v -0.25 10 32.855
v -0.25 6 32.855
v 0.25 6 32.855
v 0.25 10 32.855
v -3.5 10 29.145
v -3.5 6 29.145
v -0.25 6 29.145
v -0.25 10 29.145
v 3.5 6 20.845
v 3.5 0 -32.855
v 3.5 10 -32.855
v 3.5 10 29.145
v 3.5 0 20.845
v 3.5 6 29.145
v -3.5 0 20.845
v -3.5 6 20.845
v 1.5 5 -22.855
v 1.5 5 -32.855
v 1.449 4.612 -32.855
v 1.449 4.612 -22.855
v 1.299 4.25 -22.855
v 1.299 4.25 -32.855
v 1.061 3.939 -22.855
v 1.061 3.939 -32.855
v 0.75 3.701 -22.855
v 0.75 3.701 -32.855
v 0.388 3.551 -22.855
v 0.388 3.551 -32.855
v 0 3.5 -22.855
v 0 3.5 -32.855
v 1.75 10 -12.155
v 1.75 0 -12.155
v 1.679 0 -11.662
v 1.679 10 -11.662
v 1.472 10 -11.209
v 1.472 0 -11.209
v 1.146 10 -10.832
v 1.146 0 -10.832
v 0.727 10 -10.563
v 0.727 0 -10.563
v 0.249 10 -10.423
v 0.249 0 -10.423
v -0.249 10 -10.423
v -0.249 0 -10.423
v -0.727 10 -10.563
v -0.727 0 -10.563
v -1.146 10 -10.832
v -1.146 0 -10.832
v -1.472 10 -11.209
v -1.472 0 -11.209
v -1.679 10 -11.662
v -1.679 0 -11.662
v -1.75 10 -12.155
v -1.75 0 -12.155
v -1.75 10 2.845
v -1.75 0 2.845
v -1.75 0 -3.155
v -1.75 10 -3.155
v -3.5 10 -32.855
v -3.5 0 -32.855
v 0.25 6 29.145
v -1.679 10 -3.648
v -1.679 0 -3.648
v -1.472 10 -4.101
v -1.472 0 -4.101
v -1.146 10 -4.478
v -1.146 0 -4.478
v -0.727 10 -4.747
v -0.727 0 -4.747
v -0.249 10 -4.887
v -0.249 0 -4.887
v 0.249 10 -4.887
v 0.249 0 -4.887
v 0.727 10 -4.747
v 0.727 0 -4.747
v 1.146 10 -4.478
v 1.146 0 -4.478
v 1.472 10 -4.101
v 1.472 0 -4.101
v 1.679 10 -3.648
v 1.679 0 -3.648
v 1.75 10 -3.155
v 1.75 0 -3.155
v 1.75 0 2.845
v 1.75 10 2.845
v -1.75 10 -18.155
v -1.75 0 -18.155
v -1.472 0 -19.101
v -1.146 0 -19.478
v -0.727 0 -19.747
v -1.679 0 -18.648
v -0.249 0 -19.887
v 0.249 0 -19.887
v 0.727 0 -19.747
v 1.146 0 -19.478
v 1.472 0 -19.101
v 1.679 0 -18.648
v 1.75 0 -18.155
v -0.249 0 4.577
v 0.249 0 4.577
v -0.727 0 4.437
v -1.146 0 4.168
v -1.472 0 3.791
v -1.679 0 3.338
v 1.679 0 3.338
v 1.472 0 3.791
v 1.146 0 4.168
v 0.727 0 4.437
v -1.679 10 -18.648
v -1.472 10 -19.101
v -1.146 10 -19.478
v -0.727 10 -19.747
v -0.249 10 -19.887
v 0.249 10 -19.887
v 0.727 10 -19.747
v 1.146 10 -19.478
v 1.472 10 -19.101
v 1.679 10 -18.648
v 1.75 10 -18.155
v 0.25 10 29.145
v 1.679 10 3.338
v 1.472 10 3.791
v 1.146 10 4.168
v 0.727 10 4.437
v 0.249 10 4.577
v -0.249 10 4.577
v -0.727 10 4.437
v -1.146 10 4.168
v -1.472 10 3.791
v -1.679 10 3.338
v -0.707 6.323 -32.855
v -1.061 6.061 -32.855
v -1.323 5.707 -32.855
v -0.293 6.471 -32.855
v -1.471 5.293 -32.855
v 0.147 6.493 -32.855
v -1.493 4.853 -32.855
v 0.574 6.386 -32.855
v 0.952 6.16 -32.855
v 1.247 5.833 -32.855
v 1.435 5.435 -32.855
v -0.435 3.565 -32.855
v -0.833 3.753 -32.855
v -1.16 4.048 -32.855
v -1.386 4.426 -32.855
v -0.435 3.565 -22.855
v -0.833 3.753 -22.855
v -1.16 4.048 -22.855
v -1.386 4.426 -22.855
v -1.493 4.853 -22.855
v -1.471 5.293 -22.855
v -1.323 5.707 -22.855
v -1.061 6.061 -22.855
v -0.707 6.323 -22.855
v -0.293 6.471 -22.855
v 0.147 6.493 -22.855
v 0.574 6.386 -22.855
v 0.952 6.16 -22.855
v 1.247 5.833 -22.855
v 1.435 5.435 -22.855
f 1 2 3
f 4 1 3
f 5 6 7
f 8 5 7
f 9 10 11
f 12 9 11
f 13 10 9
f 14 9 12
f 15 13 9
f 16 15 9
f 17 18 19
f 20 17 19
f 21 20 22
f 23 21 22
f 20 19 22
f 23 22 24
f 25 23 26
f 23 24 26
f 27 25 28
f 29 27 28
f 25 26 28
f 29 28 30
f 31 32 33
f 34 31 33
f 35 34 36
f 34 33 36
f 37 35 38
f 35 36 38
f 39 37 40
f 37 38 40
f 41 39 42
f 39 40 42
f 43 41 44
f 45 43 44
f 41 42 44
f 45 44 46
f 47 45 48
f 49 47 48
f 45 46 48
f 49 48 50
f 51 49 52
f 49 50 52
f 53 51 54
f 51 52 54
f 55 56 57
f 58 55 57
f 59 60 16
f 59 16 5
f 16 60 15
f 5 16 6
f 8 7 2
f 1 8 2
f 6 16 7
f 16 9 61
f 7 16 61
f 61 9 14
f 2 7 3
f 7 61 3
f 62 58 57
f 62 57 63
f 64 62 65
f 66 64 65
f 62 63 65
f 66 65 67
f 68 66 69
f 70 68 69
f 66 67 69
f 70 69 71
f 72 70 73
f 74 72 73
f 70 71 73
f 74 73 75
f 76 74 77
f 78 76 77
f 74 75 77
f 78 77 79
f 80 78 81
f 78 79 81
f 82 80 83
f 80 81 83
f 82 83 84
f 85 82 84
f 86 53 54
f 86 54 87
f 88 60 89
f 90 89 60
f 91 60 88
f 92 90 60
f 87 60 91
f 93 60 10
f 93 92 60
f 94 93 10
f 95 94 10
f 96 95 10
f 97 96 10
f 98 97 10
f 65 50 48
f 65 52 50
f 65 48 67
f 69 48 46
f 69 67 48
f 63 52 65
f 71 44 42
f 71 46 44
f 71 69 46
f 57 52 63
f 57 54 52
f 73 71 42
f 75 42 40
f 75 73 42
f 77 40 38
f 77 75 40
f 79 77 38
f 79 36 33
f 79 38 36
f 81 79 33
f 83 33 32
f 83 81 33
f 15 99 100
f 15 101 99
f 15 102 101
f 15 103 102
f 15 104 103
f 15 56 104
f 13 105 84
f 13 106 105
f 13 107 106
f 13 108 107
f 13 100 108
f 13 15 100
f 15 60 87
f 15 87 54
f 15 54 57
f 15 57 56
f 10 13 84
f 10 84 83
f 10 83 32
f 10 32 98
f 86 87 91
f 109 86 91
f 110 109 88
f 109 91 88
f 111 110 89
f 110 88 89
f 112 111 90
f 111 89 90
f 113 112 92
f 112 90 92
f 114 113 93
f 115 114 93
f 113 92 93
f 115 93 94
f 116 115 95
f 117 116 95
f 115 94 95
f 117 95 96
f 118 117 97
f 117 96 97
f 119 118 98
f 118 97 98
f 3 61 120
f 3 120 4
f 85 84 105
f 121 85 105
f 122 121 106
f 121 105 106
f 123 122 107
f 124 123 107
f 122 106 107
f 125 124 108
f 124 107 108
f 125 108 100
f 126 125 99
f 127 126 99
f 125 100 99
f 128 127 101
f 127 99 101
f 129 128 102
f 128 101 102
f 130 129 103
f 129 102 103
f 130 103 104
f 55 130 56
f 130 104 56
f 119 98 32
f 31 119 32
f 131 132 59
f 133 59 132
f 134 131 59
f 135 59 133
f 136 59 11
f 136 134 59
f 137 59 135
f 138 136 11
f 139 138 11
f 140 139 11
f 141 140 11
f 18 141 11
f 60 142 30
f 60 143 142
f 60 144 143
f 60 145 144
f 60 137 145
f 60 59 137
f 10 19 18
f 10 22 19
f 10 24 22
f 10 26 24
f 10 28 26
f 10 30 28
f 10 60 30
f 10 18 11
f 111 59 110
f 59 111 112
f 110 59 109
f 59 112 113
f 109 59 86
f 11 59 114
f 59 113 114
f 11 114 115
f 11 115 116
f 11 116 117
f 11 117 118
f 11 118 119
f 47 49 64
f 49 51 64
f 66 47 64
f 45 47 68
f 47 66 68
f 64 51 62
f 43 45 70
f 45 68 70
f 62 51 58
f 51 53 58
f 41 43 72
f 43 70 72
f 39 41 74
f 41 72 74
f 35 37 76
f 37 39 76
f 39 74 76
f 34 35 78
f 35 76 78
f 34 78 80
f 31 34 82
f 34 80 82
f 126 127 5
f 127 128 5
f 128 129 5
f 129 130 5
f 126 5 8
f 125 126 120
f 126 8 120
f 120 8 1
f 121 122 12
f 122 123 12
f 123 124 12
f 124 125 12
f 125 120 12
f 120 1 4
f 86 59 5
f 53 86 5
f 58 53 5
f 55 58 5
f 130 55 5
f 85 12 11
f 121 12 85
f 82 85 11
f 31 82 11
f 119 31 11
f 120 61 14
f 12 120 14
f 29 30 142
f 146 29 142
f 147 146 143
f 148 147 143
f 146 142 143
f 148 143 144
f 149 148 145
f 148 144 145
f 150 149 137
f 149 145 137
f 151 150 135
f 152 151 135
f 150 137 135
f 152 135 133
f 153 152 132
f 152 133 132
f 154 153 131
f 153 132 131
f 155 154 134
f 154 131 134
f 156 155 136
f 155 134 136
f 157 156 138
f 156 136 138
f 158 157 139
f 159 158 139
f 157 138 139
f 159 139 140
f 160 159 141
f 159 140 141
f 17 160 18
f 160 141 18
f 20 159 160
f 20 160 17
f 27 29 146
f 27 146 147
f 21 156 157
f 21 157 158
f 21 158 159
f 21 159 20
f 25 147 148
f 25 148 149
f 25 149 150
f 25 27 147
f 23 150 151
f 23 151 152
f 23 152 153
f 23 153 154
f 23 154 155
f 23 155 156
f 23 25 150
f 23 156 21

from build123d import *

# Parameters (mm, degrees)
F0_W     = 7
F0_H     = 65.71
F1_DEPTH = 10
F2_W     = 3.25
F2_H     = 3.71
F3_DEPTH = 10
F5_DEPTH = 10
F6_W     = 6
F6_H     = 12.01
F7_DEPTH = 7
F9_DEPTH = 10


with BuildPart() as f1:
    # F0 (on Front) → F1 (new body)
    with BuildSketch(Plane.XZ):
        Rectangle(F0_W, F0_H)
    extrude(amount=-F1_DEPTH)

    # F2 (on face) → F3 (cut, through all)
    with BuildSketch(Plane.XZ):
        with Locations((-1.875, 31)):
            Rectangle(F2_W, F2_H)
        with Locations((1.875, 31)):
            Rectangle(F2_W, F2_H)
    extrude(amount=-F3_DEPTH, mode=Mode.SUBTRACT)

    # F4 (on face) → F5 (cut, through all)
    with BuildSketch(Plane.XZ):
        with BuildLine():
            Line((-1.75, -12.155), (-1.75, -18.155))
            ThreePointArc((-1.75, -18.155), (0, -19.905), (1.75, -18.155))
            Line((1.75, -18.155), (1.75, -12.155))
            ThreePointArc((1.75, -12.155), (0, -10.405), (-1.75, -12.155))
        make_face()
        with BuildLine():
            Line((-1.75, 2.845), (-1.75, -3.155))
            ThreePointArc((-1.75, -3.155), (0, -4.905), (1.75, -3.155))
            Line((1.75, -3.155), (1.75, 2.845))
            ThreePointArc((1.75, 2.845), (0, 4.595), (-1.75, 2.845))
        make_face()
    extrude(amount=-F5_DEPTH, mode=Mode.SUBTRACT)

    # F6 (on face) → F7 (cut, through all)
    with BuildSketch(Plane.YZ.offset(3.5)):
        with Locations((3, 26.85)):
            Rectangle(F6_W, F6_H)
    extrude(amount=-F7_DEPTH, mode=Mode.SUBTRACT)

    # F8 (on face) → F9 (cut)
    with BuildSketch(Plane(origin=(0, 0, -32.855), x_dir=(1, 0, 0), z_dir=(0, 0, -1))):
        with BuildLine():
            ThreePointArc((0, -3.5), (-1.06066, -6.06066), (1.5, -5))
            ThreePointArc((1.5, -5), (1.06066, -3.93934), (0, -3.5))
        make_face()
    extrude(amount=-F9_DEPTH, mode=Mode.SUBTRACT)


solid = f1.part
